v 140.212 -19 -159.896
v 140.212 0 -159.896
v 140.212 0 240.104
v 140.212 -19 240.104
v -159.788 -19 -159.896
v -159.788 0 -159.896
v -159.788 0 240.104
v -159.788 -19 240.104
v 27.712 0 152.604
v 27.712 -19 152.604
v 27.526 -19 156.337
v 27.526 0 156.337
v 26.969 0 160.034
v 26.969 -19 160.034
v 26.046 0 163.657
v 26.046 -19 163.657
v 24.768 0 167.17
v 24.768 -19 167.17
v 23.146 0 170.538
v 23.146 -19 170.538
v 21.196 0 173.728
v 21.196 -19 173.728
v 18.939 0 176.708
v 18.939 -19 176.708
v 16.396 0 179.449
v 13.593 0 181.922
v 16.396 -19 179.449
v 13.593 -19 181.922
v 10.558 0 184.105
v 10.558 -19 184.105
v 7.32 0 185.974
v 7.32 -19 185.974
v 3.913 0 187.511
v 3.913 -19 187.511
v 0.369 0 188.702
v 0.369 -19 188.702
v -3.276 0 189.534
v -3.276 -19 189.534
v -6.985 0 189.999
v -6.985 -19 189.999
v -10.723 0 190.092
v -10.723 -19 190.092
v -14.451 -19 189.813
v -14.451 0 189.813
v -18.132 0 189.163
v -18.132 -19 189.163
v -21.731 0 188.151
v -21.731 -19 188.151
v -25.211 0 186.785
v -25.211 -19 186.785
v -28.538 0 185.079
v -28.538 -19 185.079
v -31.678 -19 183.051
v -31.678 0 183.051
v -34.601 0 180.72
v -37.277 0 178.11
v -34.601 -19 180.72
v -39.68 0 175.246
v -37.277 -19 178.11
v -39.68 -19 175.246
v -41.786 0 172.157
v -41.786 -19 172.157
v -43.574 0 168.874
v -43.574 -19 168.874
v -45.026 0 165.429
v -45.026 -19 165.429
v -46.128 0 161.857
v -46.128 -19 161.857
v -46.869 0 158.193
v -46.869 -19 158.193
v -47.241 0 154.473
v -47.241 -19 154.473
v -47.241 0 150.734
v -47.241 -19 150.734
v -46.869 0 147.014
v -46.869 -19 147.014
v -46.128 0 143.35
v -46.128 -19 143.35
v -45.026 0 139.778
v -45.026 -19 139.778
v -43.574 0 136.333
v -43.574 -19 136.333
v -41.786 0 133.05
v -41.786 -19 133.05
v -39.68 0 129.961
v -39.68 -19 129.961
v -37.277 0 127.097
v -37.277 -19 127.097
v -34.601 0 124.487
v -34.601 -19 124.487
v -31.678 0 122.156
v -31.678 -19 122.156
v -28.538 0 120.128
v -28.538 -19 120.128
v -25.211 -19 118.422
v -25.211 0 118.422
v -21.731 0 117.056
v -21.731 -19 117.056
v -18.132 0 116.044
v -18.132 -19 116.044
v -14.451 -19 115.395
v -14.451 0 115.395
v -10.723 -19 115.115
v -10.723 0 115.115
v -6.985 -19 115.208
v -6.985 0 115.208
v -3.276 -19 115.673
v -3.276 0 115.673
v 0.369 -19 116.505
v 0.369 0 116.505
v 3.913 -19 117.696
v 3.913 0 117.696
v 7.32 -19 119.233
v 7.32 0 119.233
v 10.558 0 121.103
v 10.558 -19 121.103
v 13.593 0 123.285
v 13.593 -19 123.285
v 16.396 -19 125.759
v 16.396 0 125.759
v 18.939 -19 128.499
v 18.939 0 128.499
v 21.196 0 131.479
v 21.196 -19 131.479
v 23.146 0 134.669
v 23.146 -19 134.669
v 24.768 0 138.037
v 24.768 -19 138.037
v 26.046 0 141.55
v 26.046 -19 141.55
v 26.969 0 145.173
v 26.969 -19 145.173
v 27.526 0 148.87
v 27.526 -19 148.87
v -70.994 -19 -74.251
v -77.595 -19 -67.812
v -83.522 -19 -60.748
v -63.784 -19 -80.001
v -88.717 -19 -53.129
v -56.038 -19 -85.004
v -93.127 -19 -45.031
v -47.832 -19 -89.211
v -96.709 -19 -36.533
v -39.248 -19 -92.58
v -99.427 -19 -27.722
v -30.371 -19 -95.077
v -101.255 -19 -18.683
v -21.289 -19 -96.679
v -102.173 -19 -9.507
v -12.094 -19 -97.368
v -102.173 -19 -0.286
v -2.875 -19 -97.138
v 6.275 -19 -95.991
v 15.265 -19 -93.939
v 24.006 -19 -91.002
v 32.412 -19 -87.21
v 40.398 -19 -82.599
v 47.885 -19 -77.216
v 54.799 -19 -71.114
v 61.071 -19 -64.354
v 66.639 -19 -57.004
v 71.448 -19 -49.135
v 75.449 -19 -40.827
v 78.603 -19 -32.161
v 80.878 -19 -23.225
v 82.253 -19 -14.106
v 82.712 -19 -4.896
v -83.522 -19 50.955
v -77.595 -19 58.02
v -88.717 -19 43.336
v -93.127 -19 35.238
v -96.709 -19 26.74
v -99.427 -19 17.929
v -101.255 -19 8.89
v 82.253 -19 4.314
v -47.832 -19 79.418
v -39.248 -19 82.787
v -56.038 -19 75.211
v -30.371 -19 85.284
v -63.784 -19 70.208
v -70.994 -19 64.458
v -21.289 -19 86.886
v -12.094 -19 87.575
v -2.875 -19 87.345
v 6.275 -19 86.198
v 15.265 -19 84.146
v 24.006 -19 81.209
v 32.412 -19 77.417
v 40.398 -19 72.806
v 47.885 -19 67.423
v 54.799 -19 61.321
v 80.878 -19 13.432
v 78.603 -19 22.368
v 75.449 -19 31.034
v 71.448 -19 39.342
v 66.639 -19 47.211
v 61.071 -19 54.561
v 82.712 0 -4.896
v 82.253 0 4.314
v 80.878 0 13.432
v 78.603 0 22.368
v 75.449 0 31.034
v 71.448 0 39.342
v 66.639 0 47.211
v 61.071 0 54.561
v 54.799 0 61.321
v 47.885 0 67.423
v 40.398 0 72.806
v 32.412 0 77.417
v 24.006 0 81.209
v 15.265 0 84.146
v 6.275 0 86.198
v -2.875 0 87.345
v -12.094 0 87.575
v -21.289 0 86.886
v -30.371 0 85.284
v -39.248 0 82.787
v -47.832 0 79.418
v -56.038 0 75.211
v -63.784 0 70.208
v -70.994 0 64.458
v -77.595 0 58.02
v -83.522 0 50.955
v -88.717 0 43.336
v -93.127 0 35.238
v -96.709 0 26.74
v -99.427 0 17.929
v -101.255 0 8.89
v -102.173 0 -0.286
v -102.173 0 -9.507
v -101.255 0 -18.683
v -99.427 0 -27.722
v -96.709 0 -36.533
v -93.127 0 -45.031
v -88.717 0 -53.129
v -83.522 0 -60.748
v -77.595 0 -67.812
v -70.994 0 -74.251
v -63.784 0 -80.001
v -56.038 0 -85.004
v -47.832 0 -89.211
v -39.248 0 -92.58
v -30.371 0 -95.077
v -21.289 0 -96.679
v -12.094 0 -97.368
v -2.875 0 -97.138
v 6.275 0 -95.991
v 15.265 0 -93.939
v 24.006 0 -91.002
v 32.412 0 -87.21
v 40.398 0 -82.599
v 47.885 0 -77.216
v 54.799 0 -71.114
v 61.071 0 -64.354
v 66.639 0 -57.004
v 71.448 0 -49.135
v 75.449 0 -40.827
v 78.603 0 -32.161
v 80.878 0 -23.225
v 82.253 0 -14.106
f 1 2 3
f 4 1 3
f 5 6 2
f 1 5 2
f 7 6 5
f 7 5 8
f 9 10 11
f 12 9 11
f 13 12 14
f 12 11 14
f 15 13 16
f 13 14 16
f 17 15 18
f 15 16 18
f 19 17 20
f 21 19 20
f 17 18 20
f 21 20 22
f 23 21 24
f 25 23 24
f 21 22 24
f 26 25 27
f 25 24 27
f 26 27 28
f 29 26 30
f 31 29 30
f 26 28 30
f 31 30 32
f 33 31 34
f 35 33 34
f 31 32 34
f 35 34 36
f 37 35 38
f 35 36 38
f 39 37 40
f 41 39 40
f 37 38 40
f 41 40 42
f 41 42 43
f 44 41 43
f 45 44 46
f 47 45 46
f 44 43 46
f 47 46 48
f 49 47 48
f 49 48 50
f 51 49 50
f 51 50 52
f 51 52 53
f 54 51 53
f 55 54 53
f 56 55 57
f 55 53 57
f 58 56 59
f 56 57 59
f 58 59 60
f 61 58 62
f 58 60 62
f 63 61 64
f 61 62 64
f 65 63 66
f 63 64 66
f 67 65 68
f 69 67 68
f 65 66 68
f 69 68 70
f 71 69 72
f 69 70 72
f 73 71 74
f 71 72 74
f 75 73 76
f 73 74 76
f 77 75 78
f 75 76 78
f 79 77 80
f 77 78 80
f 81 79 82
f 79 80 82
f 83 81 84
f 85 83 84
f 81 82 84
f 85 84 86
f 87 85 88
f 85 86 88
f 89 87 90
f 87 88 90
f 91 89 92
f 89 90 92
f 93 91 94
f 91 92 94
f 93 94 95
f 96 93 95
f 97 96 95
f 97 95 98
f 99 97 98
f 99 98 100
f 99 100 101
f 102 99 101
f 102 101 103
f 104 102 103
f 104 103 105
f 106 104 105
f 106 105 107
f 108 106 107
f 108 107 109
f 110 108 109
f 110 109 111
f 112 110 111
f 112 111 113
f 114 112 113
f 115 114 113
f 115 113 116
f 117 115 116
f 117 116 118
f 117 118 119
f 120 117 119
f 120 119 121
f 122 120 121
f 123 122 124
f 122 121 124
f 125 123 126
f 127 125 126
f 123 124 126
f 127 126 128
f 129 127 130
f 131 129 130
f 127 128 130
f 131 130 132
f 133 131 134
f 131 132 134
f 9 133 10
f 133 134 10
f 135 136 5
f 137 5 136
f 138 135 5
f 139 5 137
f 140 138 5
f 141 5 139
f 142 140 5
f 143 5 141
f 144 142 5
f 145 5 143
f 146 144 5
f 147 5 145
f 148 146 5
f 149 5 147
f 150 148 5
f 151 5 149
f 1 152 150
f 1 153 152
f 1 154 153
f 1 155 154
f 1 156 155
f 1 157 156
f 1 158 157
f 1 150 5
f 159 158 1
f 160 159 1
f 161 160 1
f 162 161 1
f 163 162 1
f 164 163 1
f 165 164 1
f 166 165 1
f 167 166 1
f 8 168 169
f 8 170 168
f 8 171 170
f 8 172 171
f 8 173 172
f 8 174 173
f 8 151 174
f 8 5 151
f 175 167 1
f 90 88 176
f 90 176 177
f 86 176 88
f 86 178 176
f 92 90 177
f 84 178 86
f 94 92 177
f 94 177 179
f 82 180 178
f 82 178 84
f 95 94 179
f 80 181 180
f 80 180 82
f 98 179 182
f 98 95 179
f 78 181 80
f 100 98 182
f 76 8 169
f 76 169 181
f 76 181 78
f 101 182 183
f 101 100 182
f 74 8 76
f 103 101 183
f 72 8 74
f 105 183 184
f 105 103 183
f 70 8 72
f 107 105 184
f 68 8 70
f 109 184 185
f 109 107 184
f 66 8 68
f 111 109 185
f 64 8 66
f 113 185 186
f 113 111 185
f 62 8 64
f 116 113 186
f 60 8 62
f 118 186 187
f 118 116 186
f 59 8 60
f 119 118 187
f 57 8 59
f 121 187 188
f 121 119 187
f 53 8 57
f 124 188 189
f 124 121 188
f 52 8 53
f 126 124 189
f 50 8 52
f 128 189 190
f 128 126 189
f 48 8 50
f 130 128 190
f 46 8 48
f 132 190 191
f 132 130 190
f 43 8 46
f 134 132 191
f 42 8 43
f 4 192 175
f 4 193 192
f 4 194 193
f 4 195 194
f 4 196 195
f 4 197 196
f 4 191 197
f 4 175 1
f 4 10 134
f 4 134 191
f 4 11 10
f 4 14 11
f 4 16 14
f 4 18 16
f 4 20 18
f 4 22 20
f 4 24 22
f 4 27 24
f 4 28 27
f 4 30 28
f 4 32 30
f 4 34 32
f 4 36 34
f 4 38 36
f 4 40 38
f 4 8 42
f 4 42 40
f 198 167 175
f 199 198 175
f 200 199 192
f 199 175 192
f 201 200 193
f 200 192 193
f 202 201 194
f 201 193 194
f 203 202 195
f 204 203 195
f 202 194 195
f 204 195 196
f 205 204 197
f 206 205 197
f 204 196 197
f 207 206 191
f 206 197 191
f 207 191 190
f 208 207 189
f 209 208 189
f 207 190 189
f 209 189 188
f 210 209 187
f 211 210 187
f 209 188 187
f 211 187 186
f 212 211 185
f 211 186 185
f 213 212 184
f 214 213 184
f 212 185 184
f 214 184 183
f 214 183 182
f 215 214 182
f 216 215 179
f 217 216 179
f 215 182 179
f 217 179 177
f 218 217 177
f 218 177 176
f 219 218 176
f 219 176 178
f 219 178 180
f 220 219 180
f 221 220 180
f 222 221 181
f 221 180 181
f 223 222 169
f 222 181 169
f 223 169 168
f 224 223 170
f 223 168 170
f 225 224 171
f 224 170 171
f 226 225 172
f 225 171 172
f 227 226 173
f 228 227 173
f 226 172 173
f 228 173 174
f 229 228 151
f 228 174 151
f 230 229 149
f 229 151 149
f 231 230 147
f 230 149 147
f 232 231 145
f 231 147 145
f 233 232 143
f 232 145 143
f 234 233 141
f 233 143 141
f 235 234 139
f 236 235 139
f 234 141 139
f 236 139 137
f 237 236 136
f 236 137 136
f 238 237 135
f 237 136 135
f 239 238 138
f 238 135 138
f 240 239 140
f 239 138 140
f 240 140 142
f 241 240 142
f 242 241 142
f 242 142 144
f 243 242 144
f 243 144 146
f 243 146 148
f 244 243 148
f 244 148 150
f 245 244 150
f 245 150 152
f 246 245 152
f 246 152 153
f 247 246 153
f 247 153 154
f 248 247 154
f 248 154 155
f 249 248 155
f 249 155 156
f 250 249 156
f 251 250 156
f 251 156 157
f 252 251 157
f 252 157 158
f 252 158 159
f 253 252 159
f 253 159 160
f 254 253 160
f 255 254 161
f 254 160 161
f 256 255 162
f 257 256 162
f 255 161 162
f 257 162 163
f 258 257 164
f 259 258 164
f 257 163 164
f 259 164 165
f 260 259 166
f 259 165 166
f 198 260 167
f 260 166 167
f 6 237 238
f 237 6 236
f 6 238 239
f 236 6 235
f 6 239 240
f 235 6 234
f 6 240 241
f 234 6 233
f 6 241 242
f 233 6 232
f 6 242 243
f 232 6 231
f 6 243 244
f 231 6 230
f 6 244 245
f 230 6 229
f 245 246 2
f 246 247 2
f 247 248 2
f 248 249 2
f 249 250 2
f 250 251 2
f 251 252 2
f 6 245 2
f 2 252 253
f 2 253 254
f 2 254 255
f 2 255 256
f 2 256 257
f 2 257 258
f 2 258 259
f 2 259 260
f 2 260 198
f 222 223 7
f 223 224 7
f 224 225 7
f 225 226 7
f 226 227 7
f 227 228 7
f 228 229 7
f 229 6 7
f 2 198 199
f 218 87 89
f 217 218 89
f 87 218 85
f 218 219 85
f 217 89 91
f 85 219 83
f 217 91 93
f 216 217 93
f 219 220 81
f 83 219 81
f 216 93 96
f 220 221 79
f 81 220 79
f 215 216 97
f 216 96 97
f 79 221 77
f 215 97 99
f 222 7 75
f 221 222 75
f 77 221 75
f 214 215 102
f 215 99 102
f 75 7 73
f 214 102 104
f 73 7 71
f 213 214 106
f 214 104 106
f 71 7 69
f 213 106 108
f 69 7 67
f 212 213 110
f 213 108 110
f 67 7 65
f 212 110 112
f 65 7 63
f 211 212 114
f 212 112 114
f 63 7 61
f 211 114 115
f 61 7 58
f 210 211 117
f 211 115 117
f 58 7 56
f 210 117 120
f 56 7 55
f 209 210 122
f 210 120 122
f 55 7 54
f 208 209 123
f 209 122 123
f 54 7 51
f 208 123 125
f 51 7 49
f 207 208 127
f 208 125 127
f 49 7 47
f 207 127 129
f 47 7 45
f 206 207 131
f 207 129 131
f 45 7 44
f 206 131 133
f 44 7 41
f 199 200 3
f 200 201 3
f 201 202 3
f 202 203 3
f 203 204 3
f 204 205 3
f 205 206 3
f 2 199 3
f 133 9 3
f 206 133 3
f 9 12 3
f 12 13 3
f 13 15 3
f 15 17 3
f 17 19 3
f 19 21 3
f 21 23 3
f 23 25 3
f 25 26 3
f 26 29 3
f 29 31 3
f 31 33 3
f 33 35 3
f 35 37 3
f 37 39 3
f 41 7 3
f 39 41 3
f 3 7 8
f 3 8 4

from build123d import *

# Parameters (mm, degrees)
F0_W     = 300
F0_H     = 400
F1_DEPTH = 19
F2_R     = 37.5
F2_R_2   = 92.5
F3_DEPTH = 19


with BuildPart() as f1:
    # F0 (on Front) → F1 (new body)
    with BuildSketch(Plane.XZ):
        with Locations((-9.787694, 40.103535)):
            Rectangle(F0_W, F0_H)
    extrude(amount=F1_DEPTH)

    # F2 (on face) → F3 (cut)
    with BuildSketch(Plane.XZ.offset(19)):
        with Locations((-9.787694, 152.603535)):
            Circle(F2_R)
        with Locations((-9.787694, -4.896465)):
            Circle(F2_R_2)
    extrude(amount=-F3_DEPTH, mode=Mode.SUBTRACT)


solid = f1.part
